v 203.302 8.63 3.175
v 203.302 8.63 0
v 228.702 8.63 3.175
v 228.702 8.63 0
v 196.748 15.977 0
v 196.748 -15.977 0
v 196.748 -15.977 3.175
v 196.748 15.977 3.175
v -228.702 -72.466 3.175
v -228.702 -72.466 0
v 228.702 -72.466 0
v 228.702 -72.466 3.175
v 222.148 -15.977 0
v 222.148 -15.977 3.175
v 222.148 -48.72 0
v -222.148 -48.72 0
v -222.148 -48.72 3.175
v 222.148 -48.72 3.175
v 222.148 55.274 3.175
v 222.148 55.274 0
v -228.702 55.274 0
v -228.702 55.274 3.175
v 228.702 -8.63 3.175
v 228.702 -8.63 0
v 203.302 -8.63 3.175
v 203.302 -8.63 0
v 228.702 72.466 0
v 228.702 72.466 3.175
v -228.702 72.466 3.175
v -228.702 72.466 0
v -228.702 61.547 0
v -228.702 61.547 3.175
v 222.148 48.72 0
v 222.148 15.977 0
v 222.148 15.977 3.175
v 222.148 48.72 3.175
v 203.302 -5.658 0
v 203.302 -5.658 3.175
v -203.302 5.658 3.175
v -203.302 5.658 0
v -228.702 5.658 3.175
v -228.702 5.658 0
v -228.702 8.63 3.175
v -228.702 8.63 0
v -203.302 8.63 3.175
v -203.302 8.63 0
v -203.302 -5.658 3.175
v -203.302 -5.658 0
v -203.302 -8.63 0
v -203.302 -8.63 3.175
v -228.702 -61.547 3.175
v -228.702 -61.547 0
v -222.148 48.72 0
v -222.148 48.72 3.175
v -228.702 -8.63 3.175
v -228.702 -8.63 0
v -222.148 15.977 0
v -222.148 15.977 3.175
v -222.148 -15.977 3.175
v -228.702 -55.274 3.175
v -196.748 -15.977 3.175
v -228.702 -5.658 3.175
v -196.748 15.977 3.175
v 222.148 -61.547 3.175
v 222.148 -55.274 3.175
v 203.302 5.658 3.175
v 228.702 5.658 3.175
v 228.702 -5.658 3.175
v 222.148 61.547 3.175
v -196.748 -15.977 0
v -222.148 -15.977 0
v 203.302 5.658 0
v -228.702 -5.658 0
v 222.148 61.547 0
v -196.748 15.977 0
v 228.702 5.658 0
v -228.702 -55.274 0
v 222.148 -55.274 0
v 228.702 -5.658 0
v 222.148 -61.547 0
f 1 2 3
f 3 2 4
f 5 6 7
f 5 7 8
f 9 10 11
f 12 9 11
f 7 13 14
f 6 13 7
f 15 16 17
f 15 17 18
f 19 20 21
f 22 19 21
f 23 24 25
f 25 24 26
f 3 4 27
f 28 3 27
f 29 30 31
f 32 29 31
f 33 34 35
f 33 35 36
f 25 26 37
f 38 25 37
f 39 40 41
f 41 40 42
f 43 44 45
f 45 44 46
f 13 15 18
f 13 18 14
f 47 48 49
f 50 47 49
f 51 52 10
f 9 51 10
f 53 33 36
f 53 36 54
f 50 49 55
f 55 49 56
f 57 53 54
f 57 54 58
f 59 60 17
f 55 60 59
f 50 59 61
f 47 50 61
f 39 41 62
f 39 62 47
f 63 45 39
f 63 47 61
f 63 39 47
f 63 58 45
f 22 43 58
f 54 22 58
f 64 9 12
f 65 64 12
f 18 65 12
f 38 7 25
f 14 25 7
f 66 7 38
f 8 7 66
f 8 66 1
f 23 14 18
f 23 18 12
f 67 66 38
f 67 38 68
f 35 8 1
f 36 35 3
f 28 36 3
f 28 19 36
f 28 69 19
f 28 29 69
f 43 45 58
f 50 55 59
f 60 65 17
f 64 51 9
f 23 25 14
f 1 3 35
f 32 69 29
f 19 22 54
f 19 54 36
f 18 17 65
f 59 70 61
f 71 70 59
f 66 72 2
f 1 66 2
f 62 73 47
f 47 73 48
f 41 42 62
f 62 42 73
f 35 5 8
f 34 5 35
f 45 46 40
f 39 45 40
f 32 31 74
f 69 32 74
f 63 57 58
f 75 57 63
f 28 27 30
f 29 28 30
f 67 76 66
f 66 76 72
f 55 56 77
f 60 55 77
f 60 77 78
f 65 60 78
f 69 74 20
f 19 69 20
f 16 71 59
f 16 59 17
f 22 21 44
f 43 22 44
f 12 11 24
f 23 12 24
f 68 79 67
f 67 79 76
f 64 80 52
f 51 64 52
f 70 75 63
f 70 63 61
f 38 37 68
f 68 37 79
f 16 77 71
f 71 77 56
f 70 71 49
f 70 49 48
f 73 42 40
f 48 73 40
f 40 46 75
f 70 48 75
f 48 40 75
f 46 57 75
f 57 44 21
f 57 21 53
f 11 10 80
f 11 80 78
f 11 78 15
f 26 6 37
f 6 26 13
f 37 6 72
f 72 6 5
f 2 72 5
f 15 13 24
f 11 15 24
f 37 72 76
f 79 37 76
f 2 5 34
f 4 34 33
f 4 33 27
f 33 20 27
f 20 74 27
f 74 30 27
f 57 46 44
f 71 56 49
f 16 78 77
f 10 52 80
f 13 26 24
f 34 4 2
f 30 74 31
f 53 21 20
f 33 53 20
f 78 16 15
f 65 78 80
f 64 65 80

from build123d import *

# Parameters (mm, degrees)
BOSS_EXTRUDE1_DEPTH = 3.175


with BuildPart() as part:
    # Sketch1 → Boss-Extrude1 (new body)
    with BuildSketch(Plane.XY):
        Polygon((-228.7016, 8.62965), (-203.3016, 8.62965), (-203.3016, 5.65785), (-228.7016, 5.65785), (-228.7016, -5.65785), (-203.3016, -5.65785), (-203.3016, -8.62965), (-228.7016, -8.62965), (-228.7016, -55.273575), (222.1484, -55.273575), (222.1484, -61.547375), (-228.7016, -61.547375), (-228.7016, -72.4662), (228.7016, -72.4662), (228.7016, -8.62965), (203.3016, -8.62965), (203.3016, -5.65785), (228.7016, -5.65785), (228.7016, 5.65785), (203.3016, 5.65785), (203.3016, 8.62965), (228.7016, 8.62965), (228.7016, 72.4662), (-228.7016, 72.4662), (-228.7016, 61.547375), (222.1484, 61.547375), (222.1484, 55.273575), (-228.7016, 55.273575), align=None)
        Polygon((222.1484, -48.720375), (222.1484, -15.9766), (196.7484, -15.9766), (196.7484, 15.9766), (222.1484, 15.9766), (222.1484, 48.720375), (-222.1484, 48.720375), (-222.1484, 15.9766), (-196.7484, 15.9766), (-196.7484, -15.9766), (-222.1484, -15.9766), (-222.1484, -48.720375), align=None, mode=Mode.SUBTRACT)
    extrude(amount=BOSS_EXTRUDE1_DEPTH)


solid = part.part
